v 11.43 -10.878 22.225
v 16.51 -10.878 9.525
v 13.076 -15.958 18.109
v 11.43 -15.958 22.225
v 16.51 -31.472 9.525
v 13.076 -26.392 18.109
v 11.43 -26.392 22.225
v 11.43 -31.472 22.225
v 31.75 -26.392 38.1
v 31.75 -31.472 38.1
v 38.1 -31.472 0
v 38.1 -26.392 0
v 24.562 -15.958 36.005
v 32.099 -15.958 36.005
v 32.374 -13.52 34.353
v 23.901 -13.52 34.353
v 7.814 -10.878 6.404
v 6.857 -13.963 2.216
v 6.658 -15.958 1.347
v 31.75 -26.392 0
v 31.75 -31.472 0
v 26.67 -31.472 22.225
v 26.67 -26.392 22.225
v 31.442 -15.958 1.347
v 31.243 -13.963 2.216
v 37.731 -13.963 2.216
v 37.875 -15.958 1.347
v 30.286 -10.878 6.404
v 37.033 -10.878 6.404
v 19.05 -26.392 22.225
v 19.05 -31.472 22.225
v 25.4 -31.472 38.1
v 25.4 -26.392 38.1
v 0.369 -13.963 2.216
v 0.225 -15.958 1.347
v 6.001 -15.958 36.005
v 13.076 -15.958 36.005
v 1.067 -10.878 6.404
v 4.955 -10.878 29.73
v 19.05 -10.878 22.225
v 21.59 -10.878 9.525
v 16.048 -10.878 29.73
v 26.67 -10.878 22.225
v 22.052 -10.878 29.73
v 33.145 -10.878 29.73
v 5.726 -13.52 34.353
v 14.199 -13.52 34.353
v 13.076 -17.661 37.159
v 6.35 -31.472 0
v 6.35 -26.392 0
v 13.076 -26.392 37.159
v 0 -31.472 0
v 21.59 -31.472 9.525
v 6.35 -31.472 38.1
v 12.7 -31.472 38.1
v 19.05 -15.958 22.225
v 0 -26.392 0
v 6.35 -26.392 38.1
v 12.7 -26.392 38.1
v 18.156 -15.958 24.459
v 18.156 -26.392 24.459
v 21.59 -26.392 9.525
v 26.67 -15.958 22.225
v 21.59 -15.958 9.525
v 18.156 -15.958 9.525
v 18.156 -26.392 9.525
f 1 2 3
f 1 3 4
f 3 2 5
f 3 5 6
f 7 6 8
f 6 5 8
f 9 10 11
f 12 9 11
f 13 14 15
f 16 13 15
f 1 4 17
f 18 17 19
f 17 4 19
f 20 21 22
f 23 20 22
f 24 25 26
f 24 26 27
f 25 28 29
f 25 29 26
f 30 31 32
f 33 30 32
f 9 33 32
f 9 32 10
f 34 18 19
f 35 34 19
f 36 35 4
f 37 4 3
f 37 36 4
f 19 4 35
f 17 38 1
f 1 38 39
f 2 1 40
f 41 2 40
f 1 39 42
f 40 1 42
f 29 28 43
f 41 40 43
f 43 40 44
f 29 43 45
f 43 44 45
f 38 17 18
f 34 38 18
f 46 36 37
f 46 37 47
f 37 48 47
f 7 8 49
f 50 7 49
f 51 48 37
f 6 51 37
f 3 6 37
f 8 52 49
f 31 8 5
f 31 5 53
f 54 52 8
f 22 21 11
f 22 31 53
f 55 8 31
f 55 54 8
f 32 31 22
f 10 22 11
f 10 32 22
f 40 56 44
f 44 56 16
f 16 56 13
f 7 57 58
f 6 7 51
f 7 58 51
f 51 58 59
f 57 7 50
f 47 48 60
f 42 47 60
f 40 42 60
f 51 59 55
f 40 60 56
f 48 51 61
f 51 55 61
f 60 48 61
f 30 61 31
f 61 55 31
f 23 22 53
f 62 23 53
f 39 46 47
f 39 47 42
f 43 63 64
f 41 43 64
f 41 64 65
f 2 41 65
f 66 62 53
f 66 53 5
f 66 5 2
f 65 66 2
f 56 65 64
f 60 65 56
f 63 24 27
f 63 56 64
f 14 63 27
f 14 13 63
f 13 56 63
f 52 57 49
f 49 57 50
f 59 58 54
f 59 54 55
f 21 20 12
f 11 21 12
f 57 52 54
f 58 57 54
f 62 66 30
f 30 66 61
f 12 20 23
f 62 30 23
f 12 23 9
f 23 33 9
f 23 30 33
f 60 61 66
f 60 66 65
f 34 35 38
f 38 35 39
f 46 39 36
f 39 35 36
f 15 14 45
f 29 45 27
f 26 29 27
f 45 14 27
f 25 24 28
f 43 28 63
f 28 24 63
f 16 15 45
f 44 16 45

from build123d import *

# Parameters (mm, degrees)
F0_W      = 38.1
F0_H      = 38.1
F1_DEPTH  = 38.1
F6_DEPTH  = 38.1
F7_W      = 4.854846
F7_H      = 38.1
F8_DEPTH  = 38.1
F9_W      = 19.943573
F9_H      = 10.434402
F9_W_2    = 13.076427
F9_W_3    = 38.1
F9_H_2    = 6.627924
F9_H_3    = 10.877674
F10_DEPTH = 38.1


with BuildPart() as f1:
    # F0 (on Front) → F1 (new body)
    with BuildSketch(Plane.XZ):
        with Locations((19.05, 19.05)):
            Rectangle(F0_W, F0_H)
    extrude(amount=F1_DEPTH)

    # F5 (on offset) → F6 (cut)
    with BuildSketch(Plane.XZ.offset(38.1)):
        Polygon((0, 38.1), (0, 0), (6.35, 38.1), align=None)
        Polygon((25.4, 38.1), (12.7, 38.1), (19.05, 22.225), align=None)
        Polygon((31.75, 38.1), (38.1, 0), (38.1, 38.1), align=None)
        Polygon((11.43, 22.225), (6.35, 0), (31.75, 0), (26.67, 22.225), (21.59, 9.525), (16.51, 9.525), align=None)
    extrude(amount=-F6_DEPTH, mode=Mode.SUBTRACT)

    # F7 (on offset) → F8 (cut)
    with BuildSketch(Plane.YZ.offset(38.1)):
        with Locations((-35.672577, 19.05)):
            Rectangle(F7_W, F7_H)
        Polygon((-19.05, 0), (0, 0), (0, 38.1), (-19.05, 38.1), (-13.519695, 34.353327), (-10.860084, 29.699003), (-10.860084, 19.725459), (-10.860084, 13.076427), (-10.860084, 6.427397), (-13.962964, 2.216344), align=None)
    extrude(amount=-F8_DEPTH, mode=Mode.SUBTRACT)

    # F9 (on offset) → F10 (cut)
    with BuildSketch(Plane.XY.offset(38.1)):
        with Locations((28.128214, -21.174875)):
            Rectangle(F9_W, F9_H)
        with Locations((6.538213, -21.174875)):
            Rectangle(F9_W_2, F9_H)
        with Locations((19.05, -34.786038)):
            Rectangle(F9_W_3, F9_H_2)
        with Locations((19.05, -5.438837)):
            Rectangle(F9_W_3, F9_H_3)
    extrude(amount=-F10_DEPTH, mode=Mode.SUBTRACT)


solid = f1.part
